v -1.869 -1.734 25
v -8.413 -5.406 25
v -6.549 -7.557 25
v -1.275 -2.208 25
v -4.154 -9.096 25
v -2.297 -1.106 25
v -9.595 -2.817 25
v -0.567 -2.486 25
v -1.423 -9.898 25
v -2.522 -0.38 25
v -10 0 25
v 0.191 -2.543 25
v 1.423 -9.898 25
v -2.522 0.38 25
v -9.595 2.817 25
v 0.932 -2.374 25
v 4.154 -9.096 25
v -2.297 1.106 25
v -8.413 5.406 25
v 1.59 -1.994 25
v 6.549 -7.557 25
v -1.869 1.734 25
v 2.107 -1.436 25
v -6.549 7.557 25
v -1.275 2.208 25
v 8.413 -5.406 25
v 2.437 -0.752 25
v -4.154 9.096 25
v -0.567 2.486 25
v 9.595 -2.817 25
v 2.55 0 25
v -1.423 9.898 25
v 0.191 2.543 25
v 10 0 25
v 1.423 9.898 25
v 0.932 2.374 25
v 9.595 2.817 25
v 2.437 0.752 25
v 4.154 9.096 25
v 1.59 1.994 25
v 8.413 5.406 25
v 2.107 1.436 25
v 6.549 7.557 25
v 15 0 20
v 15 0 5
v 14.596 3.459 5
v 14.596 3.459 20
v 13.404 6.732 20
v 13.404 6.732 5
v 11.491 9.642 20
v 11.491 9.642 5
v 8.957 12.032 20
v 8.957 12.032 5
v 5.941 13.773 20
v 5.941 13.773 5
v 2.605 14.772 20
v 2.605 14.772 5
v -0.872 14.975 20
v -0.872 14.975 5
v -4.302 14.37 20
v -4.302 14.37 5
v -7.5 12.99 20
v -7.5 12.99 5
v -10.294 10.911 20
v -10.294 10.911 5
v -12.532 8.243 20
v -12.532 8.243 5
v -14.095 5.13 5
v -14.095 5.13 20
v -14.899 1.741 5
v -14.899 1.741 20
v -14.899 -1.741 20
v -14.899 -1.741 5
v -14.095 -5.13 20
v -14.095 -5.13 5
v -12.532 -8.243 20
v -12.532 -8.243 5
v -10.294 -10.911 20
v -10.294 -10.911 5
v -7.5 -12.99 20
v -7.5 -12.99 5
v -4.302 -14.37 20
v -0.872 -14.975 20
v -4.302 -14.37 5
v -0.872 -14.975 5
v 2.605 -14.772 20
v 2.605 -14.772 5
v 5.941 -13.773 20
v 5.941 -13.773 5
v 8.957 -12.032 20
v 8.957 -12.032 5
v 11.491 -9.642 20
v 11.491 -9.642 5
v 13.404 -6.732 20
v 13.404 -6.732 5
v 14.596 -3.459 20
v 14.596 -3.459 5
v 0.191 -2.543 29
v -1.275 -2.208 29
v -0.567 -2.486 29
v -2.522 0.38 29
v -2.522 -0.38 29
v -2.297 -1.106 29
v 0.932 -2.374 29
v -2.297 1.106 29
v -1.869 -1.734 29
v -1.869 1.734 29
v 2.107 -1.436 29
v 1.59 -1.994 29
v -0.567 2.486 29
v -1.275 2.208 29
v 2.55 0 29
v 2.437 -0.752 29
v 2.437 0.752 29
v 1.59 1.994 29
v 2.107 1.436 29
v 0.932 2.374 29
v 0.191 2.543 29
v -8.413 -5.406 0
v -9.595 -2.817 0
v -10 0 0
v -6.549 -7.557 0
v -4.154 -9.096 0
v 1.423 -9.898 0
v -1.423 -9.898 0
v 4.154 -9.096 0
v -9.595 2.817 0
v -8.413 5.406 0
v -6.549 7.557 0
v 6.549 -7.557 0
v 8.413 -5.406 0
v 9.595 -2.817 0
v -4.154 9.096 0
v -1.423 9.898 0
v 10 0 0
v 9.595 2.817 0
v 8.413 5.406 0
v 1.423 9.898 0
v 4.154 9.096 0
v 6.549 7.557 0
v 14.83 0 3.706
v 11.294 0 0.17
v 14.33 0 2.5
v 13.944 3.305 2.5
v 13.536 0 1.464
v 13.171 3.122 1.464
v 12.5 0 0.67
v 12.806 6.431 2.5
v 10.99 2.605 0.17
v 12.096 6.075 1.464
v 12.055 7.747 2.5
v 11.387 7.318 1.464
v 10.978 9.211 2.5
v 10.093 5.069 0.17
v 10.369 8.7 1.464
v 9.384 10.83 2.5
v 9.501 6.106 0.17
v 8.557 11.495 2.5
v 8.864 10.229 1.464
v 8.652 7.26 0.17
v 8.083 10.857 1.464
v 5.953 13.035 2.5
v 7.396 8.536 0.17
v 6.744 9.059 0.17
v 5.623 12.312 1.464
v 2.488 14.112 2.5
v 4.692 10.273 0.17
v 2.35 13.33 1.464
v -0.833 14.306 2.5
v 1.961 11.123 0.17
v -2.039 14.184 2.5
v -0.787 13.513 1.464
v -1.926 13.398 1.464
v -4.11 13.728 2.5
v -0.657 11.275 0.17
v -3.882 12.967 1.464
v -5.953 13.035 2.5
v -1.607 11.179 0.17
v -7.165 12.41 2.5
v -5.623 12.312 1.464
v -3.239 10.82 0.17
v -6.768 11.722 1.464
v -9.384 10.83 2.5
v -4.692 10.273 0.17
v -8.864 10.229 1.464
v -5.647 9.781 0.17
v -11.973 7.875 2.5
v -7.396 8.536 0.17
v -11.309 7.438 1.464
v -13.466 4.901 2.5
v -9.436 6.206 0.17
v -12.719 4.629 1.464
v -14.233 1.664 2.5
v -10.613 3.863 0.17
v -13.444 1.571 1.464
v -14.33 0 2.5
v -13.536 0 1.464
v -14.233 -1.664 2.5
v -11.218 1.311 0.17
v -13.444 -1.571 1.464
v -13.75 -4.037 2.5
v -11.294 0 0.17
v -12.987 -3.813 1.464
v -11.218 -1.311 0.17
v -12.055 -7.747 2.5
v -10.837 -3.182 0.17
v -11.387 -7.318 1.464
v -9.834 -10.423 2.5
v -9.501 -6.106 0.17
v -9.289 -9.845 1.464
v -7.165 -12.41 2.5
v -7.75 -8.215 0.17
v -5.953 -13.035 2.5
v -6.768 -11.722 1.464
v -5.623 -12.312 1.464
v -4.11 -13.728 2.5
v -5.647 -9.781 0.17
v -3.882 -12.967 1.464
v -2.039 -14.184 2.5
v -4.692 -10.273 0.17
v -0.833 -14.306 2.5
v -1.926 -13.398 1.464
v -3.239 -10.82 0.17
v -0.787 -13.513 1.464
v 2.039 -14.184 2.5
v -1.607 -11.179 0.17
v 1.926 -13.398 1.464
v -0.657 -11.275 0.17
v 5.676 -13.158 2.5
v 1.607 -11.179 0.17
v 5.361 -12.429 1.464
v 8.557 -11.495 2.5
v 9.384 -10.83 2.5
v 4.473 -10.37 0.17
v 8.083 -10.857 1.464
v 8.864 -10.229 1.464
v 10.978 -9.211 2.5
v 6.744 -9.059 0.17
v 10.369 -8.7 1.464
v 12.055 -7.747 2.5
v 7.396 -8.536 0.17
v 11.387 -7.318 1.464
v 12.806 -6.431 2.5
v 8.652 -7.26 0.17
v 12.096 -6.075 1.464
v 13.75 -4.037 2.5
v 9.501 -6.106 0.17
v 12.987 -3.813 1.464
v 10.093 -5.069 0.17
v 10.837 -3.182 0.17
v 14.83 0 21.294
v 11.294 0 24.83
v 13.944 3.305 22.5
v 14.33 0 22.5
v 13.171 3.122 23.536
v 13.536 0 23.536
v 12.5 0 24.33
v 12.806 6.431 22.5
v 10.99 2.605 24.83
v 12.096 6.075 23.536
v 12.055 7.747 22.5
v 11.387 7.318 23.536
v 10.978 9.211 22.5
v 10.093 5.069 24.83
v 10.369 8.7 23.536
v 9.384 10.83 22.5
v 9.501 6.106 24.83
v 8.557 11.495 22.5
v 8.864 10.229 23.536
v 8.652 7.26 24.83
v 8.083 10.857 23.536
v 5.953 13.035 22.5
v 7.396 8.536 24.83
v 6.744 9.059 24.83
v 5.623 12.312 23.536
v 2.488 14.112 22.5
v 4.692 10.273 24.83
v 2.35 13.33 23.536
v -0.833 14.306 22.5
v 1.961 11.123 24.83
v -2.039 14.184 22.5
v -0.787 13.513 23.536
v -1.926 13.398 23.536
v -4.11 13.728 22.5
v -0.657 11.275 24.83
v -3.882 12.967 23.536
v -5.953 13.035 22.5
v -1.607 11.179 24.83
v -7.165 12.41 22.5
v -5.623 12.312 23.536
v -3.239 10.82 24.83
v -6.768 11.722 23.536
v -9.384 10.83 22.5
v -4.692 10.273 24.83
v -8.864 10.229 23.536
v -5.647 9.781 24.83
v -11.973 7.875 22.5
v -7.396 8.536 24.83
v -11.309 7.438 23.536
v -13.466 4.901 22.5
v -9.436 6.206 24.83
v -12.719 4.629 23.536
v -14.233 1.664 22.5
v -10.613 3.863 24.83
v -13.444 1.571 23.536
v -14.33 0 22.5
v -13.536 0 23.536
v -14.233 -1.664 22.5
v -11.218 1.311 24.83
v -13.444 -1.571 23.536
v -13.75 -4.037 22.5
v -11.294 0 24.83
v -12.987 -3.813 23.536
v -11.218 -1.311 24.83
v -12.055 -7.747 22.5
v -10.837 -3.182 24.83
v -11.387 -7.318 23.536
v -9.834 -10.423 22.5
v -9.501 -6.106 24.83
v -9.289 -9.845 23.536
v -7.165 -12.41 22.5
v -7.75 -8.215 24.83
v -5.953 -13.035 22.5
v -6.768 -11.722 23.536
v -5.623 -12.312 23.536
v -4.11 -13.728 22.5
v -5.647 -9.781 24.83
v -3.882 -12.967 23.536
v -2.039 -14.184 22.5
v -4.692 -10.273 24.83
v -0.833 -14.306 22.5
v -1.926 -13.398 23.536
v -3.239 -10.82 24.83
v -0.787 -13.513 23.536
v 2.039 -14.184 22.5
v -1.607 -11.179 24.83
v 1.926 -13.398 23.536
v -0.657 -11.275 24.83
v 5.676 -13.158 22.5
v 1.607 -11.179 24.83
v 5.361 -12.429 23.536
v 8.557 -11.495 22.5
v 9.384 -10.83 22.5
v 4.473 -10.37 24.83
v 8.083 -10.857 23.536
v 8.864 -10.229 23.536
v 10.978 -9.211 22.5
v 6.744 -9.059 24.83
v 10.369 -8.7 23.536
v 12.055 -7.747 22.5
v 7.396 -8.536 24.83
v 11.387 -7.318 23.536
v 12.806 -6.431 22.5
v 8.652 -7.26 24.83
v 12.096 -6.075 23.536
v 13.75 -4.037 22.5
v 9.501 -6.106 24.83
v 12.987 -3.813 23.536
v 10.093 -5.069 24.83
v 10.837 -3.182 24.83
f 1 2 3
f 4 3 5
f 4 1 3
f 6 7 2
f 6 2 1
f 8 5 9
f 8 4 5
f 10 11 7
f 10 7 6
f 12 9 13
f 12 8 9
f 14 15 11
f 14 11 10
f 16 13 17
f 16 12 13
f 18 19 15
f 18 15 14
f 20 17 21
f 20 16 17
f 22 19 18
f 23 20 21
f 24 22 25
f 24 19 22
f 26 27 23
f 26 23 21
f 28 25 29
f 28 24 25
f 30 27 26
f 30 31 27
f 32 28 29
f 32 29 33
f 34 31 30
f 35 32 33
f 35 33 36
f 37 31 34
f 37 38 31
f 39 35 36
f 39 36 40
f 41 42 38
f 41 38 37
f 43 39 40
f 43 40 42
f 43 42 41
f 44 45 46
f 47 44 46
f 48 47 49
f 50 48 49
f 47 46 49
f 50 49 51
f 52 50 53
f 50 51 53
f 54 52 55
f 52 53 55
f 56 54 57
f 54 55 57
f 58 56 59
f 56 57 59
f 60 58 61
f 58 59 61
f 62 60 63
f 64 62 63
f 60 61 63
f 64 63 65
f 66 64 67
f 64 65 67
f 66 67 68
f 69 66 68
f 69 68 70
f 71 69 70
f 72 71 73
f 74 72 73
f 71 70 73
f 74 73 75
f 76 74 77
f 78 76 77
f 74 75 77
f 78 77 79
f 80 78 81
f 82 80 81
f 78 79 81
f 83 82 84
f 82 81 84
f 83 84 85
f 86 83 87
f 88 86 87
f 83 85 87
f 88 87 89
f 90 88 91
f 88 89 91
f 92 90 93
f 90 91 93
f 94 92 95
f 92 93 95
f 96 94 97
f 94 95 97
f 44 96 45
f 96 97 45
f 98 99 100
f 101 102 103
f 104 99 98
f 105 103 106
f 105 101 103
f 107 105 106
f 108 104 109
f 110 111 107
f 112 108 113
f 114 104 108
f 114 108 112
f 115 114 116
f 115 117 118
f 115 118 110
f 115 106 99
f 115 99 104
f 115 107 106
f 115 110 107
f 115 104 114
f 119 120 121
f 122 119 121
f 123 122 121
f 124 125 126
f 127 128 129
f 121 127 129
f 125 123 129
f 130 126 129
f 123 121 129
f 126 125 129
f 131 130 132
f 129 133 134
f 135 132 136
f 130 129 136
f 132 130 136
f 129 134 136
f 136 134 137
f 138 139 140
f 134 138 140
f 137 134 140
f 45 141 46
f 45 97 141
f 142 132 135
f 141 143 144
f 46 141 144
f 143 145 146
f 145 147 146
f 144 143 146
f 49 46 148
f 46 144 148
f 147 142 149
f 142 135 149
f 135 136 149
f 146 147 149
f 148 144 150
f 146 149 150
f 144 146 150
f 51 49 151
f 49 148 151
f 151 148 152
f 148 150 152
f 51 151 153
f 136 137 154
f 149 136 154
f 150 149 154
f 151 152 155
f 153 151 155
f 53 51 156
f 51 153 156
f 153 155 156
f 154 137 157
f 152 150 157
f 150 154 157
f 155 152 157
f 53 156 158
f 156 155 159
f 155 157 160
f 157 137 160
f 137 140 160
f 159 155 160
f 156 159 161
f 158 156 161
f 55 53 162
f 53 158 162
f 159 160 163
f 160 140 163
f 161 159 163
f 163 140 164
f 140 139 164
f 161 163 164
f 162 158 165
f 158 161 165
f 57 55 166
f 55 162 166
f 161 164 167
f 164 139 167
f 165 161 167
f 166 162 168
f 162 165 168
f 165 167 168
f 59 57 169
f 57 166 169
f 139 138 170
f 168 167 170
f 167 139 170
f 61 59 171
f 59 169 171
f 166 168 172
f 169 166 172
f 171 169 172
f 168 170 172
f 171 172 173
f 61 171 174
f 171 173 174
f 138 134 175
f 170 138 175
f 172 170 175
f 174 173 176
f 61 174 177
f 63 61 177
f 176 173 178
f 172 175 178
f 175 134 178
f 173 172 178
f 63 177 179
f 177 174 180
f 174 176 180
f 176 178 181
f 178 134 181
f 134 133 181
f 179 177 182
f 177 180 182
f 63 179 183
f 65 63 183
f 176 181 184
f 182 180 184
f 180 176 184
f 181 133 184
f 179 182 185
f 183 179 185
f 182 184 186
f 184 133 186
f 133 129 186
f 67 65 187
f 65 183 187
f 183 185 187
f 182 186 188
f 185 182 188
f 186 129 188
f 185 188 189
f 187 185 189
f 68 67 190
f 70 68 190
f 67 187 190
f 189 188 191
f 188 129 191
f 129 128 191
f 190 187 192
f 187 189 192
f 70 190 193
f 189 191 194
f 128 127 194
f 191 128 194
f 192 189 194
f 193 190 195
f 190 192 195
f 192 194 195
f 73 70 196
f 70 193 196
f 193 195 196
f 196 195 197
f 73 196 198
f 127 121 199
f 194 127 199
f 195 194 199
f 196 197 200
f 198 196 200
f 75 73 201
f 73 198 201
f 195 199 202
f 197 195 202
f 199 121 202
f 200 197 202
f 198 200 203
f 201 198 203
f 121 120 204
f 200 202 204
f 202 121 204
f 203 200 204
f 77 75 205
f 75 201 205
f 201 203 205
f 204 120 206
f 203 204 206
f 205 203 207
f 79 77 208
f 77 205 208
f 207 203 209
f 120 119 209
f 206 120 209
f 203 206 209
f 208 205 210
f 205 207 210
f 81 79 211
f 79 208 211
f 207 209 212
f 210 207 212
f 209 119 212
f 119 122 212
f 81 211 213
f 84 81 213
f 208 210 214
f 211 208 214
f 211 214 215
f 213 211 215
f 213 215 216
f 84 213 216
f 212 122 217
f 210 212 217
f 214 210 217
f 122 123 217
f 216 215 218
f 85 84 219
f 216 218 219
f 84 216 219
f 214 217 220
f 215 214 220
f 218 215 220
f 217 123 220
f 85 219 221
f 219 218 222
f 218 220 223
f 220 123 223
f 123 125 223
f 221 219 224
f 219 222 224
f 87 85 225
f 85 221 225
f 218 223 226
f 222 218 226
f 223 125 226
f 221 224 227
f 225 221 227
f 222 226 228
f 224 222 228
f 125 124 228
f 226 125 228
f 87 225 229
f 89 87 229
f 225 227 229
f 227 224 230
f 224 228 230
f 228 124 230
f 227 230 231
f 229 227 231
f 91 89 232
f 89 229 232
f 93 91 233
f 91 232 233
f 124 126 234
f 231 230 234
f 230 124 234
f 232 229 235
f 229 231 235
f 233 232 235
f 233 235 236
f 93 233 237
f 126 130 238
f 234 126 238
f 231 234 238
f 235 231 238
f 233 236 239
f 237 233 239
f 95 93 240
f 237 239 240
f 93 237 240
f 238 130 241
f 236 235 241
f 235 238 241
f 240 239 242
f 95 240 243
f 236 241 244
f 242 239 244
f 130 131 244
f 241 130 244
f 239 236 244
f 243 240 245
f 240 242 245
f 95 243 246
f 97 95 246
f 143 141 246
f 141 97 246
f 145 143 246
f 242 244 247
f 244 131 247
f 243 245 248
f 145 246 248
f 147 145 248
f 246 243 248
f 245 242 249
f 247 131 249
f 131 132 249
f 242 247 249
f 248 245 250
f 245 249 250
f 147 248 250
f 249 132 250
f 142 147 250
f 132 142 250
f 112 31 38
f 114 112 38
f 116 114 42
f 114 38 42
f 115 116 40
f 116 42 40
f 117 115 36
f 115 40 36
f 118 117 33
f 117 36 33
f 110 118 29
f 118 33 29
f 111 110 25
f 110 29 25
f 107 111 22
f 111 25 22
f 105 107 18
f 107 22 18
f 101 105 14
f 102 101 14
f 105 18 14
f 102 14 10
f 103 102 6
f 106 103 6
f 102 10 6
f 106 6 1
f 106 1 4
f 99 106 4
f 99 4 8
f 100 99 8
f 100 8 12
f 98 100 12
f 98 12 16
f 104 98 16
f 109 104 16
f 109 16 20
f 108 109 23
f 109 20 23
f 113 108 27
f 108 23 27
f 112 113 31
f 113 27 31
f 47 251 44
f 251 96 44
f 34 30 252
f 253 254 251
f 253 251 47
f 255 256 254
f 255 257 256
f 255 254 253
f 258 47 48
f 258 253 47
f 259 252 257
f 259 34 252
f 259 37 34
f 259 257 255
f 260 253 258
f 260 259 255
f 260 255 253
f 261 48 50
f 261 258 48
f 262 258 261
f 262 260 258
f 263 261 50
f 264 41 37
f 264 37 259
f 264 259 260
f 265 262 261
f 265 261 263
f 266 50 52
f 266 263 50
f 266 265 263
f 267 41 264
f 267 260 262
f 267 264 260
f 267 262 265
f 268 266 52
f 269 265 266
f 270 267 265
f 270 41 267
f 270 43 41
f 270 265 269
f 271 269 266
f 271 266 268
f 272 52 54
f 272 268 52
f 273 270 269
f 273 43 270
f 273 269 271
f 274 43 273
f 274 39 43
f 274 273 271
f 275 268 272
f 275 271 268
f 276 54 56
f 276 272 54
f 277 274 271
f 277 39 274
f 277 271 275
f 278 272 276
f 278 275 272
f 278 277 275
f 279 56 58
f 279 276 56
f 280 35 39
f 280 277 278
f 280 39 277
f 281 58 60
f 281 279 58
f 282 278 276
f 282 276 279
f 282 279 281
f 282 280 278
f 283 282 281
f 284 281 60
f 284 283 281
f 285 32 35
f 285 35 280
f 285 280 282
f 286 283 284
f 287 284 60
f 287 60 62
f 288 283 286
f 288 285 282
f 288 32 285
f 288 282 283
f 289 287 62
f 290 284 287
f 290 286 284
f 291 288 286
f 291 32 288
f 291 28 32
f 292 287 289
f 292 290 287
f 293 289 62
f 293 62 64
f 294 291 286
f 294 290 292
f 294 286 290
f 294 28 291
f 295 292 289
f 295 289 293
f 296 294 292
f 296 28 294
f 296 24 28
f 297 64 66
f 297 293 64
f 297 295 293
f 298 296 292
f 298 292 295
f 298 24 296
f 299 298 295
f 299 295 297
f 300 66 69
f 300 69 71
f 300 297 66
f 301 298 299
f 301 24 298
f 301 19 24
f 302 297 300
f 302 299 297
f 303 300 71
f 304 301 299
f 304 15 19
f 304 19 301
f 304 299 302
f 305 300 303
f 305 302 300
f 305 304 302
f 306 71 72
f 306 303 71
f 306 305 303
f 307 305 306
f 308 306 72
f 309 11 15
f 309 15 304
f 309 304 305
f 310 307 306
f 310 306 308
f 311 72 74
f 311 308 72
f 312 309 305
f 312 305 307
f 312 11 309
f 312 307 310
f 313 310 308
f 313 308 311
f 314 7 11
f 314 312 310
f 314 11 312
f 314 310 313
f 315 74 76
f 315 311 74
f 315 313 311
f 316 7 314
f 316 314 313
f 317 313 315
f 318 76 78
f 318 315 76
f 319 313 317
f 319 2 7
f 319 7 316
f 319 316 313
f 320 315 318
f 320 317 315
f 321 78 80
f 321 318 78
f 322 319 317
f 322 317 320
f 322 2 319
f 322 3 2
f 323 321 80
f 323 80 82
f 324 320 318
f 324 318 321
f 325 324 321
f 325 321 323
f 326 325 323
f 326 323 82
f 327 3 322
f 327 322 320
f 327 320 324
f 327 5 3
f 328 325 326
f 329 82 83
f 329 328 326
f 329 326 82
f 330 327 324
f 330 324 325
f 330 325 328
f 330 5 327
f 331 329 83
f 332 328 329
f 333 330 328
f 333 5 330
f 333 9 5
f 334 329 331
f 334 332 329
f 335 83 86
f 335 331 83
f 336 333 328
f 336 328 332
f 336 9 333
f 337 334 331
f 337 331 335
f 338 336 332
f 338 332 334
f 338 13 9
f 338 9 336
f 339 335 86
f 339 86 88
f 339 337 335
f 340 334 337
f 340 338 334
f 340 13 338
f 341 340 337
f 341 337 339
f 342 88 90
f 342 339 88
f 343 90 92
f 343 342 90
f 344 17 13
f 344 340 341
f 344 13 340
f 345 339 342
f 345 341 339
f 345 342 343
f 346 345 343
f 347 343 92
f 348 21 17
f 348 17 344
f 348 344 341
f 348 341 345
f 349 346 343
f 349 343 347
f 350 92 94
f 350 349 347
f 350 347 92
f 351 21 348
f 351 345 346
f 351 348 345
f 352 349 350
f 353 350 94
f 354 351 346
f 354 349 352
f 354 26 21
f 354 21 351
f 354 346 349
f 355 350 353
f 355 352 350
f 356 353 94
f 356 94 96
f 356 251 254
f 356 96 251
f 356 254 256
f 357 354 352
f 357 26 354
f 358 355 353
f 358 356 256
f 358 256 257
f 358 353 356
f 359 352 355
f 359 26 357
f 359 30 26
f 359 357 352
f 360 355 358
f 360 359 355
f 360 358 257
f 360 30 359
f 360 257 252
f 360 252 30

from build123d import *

# Parameters (mm, degrees)
CROQUIS1_R              = 15
SALIENTE_EXTRUIR1_DEPTH = 25
REDONDEO2_R             = 5
CROQUIS2_R              = 2.55
SALIENTE_EXTRUIR2_DEPTH = 4


with BuildPart() as part:
    # Croquis1 → Saliente-Extruir1 (new body)
    with BuildSketch(Plane.XY):
        Circle(CROQUIS1_R)
    extrude(amount=SALIENTE_EXTRUIR1_DEPTH)

    # Redondeo2
    redondeo2_edges = [part.edges().sort_by_distance(p)[0] for p in [
        (-15, 0, 0),
        (-15, 0, 25),
    ]]
    fillet(redondeo2_edges, radius=REDONDEO2_R)

    # Croquis2 → Saliente-Extruir2 (add)
    with BuildSketch(Plane.XY.offset(25)):
        Circle(CROQUIS2_R)
    extrude(amount=SALIENTE_EXTRUIR2_DEPTH)


solid = part.part
